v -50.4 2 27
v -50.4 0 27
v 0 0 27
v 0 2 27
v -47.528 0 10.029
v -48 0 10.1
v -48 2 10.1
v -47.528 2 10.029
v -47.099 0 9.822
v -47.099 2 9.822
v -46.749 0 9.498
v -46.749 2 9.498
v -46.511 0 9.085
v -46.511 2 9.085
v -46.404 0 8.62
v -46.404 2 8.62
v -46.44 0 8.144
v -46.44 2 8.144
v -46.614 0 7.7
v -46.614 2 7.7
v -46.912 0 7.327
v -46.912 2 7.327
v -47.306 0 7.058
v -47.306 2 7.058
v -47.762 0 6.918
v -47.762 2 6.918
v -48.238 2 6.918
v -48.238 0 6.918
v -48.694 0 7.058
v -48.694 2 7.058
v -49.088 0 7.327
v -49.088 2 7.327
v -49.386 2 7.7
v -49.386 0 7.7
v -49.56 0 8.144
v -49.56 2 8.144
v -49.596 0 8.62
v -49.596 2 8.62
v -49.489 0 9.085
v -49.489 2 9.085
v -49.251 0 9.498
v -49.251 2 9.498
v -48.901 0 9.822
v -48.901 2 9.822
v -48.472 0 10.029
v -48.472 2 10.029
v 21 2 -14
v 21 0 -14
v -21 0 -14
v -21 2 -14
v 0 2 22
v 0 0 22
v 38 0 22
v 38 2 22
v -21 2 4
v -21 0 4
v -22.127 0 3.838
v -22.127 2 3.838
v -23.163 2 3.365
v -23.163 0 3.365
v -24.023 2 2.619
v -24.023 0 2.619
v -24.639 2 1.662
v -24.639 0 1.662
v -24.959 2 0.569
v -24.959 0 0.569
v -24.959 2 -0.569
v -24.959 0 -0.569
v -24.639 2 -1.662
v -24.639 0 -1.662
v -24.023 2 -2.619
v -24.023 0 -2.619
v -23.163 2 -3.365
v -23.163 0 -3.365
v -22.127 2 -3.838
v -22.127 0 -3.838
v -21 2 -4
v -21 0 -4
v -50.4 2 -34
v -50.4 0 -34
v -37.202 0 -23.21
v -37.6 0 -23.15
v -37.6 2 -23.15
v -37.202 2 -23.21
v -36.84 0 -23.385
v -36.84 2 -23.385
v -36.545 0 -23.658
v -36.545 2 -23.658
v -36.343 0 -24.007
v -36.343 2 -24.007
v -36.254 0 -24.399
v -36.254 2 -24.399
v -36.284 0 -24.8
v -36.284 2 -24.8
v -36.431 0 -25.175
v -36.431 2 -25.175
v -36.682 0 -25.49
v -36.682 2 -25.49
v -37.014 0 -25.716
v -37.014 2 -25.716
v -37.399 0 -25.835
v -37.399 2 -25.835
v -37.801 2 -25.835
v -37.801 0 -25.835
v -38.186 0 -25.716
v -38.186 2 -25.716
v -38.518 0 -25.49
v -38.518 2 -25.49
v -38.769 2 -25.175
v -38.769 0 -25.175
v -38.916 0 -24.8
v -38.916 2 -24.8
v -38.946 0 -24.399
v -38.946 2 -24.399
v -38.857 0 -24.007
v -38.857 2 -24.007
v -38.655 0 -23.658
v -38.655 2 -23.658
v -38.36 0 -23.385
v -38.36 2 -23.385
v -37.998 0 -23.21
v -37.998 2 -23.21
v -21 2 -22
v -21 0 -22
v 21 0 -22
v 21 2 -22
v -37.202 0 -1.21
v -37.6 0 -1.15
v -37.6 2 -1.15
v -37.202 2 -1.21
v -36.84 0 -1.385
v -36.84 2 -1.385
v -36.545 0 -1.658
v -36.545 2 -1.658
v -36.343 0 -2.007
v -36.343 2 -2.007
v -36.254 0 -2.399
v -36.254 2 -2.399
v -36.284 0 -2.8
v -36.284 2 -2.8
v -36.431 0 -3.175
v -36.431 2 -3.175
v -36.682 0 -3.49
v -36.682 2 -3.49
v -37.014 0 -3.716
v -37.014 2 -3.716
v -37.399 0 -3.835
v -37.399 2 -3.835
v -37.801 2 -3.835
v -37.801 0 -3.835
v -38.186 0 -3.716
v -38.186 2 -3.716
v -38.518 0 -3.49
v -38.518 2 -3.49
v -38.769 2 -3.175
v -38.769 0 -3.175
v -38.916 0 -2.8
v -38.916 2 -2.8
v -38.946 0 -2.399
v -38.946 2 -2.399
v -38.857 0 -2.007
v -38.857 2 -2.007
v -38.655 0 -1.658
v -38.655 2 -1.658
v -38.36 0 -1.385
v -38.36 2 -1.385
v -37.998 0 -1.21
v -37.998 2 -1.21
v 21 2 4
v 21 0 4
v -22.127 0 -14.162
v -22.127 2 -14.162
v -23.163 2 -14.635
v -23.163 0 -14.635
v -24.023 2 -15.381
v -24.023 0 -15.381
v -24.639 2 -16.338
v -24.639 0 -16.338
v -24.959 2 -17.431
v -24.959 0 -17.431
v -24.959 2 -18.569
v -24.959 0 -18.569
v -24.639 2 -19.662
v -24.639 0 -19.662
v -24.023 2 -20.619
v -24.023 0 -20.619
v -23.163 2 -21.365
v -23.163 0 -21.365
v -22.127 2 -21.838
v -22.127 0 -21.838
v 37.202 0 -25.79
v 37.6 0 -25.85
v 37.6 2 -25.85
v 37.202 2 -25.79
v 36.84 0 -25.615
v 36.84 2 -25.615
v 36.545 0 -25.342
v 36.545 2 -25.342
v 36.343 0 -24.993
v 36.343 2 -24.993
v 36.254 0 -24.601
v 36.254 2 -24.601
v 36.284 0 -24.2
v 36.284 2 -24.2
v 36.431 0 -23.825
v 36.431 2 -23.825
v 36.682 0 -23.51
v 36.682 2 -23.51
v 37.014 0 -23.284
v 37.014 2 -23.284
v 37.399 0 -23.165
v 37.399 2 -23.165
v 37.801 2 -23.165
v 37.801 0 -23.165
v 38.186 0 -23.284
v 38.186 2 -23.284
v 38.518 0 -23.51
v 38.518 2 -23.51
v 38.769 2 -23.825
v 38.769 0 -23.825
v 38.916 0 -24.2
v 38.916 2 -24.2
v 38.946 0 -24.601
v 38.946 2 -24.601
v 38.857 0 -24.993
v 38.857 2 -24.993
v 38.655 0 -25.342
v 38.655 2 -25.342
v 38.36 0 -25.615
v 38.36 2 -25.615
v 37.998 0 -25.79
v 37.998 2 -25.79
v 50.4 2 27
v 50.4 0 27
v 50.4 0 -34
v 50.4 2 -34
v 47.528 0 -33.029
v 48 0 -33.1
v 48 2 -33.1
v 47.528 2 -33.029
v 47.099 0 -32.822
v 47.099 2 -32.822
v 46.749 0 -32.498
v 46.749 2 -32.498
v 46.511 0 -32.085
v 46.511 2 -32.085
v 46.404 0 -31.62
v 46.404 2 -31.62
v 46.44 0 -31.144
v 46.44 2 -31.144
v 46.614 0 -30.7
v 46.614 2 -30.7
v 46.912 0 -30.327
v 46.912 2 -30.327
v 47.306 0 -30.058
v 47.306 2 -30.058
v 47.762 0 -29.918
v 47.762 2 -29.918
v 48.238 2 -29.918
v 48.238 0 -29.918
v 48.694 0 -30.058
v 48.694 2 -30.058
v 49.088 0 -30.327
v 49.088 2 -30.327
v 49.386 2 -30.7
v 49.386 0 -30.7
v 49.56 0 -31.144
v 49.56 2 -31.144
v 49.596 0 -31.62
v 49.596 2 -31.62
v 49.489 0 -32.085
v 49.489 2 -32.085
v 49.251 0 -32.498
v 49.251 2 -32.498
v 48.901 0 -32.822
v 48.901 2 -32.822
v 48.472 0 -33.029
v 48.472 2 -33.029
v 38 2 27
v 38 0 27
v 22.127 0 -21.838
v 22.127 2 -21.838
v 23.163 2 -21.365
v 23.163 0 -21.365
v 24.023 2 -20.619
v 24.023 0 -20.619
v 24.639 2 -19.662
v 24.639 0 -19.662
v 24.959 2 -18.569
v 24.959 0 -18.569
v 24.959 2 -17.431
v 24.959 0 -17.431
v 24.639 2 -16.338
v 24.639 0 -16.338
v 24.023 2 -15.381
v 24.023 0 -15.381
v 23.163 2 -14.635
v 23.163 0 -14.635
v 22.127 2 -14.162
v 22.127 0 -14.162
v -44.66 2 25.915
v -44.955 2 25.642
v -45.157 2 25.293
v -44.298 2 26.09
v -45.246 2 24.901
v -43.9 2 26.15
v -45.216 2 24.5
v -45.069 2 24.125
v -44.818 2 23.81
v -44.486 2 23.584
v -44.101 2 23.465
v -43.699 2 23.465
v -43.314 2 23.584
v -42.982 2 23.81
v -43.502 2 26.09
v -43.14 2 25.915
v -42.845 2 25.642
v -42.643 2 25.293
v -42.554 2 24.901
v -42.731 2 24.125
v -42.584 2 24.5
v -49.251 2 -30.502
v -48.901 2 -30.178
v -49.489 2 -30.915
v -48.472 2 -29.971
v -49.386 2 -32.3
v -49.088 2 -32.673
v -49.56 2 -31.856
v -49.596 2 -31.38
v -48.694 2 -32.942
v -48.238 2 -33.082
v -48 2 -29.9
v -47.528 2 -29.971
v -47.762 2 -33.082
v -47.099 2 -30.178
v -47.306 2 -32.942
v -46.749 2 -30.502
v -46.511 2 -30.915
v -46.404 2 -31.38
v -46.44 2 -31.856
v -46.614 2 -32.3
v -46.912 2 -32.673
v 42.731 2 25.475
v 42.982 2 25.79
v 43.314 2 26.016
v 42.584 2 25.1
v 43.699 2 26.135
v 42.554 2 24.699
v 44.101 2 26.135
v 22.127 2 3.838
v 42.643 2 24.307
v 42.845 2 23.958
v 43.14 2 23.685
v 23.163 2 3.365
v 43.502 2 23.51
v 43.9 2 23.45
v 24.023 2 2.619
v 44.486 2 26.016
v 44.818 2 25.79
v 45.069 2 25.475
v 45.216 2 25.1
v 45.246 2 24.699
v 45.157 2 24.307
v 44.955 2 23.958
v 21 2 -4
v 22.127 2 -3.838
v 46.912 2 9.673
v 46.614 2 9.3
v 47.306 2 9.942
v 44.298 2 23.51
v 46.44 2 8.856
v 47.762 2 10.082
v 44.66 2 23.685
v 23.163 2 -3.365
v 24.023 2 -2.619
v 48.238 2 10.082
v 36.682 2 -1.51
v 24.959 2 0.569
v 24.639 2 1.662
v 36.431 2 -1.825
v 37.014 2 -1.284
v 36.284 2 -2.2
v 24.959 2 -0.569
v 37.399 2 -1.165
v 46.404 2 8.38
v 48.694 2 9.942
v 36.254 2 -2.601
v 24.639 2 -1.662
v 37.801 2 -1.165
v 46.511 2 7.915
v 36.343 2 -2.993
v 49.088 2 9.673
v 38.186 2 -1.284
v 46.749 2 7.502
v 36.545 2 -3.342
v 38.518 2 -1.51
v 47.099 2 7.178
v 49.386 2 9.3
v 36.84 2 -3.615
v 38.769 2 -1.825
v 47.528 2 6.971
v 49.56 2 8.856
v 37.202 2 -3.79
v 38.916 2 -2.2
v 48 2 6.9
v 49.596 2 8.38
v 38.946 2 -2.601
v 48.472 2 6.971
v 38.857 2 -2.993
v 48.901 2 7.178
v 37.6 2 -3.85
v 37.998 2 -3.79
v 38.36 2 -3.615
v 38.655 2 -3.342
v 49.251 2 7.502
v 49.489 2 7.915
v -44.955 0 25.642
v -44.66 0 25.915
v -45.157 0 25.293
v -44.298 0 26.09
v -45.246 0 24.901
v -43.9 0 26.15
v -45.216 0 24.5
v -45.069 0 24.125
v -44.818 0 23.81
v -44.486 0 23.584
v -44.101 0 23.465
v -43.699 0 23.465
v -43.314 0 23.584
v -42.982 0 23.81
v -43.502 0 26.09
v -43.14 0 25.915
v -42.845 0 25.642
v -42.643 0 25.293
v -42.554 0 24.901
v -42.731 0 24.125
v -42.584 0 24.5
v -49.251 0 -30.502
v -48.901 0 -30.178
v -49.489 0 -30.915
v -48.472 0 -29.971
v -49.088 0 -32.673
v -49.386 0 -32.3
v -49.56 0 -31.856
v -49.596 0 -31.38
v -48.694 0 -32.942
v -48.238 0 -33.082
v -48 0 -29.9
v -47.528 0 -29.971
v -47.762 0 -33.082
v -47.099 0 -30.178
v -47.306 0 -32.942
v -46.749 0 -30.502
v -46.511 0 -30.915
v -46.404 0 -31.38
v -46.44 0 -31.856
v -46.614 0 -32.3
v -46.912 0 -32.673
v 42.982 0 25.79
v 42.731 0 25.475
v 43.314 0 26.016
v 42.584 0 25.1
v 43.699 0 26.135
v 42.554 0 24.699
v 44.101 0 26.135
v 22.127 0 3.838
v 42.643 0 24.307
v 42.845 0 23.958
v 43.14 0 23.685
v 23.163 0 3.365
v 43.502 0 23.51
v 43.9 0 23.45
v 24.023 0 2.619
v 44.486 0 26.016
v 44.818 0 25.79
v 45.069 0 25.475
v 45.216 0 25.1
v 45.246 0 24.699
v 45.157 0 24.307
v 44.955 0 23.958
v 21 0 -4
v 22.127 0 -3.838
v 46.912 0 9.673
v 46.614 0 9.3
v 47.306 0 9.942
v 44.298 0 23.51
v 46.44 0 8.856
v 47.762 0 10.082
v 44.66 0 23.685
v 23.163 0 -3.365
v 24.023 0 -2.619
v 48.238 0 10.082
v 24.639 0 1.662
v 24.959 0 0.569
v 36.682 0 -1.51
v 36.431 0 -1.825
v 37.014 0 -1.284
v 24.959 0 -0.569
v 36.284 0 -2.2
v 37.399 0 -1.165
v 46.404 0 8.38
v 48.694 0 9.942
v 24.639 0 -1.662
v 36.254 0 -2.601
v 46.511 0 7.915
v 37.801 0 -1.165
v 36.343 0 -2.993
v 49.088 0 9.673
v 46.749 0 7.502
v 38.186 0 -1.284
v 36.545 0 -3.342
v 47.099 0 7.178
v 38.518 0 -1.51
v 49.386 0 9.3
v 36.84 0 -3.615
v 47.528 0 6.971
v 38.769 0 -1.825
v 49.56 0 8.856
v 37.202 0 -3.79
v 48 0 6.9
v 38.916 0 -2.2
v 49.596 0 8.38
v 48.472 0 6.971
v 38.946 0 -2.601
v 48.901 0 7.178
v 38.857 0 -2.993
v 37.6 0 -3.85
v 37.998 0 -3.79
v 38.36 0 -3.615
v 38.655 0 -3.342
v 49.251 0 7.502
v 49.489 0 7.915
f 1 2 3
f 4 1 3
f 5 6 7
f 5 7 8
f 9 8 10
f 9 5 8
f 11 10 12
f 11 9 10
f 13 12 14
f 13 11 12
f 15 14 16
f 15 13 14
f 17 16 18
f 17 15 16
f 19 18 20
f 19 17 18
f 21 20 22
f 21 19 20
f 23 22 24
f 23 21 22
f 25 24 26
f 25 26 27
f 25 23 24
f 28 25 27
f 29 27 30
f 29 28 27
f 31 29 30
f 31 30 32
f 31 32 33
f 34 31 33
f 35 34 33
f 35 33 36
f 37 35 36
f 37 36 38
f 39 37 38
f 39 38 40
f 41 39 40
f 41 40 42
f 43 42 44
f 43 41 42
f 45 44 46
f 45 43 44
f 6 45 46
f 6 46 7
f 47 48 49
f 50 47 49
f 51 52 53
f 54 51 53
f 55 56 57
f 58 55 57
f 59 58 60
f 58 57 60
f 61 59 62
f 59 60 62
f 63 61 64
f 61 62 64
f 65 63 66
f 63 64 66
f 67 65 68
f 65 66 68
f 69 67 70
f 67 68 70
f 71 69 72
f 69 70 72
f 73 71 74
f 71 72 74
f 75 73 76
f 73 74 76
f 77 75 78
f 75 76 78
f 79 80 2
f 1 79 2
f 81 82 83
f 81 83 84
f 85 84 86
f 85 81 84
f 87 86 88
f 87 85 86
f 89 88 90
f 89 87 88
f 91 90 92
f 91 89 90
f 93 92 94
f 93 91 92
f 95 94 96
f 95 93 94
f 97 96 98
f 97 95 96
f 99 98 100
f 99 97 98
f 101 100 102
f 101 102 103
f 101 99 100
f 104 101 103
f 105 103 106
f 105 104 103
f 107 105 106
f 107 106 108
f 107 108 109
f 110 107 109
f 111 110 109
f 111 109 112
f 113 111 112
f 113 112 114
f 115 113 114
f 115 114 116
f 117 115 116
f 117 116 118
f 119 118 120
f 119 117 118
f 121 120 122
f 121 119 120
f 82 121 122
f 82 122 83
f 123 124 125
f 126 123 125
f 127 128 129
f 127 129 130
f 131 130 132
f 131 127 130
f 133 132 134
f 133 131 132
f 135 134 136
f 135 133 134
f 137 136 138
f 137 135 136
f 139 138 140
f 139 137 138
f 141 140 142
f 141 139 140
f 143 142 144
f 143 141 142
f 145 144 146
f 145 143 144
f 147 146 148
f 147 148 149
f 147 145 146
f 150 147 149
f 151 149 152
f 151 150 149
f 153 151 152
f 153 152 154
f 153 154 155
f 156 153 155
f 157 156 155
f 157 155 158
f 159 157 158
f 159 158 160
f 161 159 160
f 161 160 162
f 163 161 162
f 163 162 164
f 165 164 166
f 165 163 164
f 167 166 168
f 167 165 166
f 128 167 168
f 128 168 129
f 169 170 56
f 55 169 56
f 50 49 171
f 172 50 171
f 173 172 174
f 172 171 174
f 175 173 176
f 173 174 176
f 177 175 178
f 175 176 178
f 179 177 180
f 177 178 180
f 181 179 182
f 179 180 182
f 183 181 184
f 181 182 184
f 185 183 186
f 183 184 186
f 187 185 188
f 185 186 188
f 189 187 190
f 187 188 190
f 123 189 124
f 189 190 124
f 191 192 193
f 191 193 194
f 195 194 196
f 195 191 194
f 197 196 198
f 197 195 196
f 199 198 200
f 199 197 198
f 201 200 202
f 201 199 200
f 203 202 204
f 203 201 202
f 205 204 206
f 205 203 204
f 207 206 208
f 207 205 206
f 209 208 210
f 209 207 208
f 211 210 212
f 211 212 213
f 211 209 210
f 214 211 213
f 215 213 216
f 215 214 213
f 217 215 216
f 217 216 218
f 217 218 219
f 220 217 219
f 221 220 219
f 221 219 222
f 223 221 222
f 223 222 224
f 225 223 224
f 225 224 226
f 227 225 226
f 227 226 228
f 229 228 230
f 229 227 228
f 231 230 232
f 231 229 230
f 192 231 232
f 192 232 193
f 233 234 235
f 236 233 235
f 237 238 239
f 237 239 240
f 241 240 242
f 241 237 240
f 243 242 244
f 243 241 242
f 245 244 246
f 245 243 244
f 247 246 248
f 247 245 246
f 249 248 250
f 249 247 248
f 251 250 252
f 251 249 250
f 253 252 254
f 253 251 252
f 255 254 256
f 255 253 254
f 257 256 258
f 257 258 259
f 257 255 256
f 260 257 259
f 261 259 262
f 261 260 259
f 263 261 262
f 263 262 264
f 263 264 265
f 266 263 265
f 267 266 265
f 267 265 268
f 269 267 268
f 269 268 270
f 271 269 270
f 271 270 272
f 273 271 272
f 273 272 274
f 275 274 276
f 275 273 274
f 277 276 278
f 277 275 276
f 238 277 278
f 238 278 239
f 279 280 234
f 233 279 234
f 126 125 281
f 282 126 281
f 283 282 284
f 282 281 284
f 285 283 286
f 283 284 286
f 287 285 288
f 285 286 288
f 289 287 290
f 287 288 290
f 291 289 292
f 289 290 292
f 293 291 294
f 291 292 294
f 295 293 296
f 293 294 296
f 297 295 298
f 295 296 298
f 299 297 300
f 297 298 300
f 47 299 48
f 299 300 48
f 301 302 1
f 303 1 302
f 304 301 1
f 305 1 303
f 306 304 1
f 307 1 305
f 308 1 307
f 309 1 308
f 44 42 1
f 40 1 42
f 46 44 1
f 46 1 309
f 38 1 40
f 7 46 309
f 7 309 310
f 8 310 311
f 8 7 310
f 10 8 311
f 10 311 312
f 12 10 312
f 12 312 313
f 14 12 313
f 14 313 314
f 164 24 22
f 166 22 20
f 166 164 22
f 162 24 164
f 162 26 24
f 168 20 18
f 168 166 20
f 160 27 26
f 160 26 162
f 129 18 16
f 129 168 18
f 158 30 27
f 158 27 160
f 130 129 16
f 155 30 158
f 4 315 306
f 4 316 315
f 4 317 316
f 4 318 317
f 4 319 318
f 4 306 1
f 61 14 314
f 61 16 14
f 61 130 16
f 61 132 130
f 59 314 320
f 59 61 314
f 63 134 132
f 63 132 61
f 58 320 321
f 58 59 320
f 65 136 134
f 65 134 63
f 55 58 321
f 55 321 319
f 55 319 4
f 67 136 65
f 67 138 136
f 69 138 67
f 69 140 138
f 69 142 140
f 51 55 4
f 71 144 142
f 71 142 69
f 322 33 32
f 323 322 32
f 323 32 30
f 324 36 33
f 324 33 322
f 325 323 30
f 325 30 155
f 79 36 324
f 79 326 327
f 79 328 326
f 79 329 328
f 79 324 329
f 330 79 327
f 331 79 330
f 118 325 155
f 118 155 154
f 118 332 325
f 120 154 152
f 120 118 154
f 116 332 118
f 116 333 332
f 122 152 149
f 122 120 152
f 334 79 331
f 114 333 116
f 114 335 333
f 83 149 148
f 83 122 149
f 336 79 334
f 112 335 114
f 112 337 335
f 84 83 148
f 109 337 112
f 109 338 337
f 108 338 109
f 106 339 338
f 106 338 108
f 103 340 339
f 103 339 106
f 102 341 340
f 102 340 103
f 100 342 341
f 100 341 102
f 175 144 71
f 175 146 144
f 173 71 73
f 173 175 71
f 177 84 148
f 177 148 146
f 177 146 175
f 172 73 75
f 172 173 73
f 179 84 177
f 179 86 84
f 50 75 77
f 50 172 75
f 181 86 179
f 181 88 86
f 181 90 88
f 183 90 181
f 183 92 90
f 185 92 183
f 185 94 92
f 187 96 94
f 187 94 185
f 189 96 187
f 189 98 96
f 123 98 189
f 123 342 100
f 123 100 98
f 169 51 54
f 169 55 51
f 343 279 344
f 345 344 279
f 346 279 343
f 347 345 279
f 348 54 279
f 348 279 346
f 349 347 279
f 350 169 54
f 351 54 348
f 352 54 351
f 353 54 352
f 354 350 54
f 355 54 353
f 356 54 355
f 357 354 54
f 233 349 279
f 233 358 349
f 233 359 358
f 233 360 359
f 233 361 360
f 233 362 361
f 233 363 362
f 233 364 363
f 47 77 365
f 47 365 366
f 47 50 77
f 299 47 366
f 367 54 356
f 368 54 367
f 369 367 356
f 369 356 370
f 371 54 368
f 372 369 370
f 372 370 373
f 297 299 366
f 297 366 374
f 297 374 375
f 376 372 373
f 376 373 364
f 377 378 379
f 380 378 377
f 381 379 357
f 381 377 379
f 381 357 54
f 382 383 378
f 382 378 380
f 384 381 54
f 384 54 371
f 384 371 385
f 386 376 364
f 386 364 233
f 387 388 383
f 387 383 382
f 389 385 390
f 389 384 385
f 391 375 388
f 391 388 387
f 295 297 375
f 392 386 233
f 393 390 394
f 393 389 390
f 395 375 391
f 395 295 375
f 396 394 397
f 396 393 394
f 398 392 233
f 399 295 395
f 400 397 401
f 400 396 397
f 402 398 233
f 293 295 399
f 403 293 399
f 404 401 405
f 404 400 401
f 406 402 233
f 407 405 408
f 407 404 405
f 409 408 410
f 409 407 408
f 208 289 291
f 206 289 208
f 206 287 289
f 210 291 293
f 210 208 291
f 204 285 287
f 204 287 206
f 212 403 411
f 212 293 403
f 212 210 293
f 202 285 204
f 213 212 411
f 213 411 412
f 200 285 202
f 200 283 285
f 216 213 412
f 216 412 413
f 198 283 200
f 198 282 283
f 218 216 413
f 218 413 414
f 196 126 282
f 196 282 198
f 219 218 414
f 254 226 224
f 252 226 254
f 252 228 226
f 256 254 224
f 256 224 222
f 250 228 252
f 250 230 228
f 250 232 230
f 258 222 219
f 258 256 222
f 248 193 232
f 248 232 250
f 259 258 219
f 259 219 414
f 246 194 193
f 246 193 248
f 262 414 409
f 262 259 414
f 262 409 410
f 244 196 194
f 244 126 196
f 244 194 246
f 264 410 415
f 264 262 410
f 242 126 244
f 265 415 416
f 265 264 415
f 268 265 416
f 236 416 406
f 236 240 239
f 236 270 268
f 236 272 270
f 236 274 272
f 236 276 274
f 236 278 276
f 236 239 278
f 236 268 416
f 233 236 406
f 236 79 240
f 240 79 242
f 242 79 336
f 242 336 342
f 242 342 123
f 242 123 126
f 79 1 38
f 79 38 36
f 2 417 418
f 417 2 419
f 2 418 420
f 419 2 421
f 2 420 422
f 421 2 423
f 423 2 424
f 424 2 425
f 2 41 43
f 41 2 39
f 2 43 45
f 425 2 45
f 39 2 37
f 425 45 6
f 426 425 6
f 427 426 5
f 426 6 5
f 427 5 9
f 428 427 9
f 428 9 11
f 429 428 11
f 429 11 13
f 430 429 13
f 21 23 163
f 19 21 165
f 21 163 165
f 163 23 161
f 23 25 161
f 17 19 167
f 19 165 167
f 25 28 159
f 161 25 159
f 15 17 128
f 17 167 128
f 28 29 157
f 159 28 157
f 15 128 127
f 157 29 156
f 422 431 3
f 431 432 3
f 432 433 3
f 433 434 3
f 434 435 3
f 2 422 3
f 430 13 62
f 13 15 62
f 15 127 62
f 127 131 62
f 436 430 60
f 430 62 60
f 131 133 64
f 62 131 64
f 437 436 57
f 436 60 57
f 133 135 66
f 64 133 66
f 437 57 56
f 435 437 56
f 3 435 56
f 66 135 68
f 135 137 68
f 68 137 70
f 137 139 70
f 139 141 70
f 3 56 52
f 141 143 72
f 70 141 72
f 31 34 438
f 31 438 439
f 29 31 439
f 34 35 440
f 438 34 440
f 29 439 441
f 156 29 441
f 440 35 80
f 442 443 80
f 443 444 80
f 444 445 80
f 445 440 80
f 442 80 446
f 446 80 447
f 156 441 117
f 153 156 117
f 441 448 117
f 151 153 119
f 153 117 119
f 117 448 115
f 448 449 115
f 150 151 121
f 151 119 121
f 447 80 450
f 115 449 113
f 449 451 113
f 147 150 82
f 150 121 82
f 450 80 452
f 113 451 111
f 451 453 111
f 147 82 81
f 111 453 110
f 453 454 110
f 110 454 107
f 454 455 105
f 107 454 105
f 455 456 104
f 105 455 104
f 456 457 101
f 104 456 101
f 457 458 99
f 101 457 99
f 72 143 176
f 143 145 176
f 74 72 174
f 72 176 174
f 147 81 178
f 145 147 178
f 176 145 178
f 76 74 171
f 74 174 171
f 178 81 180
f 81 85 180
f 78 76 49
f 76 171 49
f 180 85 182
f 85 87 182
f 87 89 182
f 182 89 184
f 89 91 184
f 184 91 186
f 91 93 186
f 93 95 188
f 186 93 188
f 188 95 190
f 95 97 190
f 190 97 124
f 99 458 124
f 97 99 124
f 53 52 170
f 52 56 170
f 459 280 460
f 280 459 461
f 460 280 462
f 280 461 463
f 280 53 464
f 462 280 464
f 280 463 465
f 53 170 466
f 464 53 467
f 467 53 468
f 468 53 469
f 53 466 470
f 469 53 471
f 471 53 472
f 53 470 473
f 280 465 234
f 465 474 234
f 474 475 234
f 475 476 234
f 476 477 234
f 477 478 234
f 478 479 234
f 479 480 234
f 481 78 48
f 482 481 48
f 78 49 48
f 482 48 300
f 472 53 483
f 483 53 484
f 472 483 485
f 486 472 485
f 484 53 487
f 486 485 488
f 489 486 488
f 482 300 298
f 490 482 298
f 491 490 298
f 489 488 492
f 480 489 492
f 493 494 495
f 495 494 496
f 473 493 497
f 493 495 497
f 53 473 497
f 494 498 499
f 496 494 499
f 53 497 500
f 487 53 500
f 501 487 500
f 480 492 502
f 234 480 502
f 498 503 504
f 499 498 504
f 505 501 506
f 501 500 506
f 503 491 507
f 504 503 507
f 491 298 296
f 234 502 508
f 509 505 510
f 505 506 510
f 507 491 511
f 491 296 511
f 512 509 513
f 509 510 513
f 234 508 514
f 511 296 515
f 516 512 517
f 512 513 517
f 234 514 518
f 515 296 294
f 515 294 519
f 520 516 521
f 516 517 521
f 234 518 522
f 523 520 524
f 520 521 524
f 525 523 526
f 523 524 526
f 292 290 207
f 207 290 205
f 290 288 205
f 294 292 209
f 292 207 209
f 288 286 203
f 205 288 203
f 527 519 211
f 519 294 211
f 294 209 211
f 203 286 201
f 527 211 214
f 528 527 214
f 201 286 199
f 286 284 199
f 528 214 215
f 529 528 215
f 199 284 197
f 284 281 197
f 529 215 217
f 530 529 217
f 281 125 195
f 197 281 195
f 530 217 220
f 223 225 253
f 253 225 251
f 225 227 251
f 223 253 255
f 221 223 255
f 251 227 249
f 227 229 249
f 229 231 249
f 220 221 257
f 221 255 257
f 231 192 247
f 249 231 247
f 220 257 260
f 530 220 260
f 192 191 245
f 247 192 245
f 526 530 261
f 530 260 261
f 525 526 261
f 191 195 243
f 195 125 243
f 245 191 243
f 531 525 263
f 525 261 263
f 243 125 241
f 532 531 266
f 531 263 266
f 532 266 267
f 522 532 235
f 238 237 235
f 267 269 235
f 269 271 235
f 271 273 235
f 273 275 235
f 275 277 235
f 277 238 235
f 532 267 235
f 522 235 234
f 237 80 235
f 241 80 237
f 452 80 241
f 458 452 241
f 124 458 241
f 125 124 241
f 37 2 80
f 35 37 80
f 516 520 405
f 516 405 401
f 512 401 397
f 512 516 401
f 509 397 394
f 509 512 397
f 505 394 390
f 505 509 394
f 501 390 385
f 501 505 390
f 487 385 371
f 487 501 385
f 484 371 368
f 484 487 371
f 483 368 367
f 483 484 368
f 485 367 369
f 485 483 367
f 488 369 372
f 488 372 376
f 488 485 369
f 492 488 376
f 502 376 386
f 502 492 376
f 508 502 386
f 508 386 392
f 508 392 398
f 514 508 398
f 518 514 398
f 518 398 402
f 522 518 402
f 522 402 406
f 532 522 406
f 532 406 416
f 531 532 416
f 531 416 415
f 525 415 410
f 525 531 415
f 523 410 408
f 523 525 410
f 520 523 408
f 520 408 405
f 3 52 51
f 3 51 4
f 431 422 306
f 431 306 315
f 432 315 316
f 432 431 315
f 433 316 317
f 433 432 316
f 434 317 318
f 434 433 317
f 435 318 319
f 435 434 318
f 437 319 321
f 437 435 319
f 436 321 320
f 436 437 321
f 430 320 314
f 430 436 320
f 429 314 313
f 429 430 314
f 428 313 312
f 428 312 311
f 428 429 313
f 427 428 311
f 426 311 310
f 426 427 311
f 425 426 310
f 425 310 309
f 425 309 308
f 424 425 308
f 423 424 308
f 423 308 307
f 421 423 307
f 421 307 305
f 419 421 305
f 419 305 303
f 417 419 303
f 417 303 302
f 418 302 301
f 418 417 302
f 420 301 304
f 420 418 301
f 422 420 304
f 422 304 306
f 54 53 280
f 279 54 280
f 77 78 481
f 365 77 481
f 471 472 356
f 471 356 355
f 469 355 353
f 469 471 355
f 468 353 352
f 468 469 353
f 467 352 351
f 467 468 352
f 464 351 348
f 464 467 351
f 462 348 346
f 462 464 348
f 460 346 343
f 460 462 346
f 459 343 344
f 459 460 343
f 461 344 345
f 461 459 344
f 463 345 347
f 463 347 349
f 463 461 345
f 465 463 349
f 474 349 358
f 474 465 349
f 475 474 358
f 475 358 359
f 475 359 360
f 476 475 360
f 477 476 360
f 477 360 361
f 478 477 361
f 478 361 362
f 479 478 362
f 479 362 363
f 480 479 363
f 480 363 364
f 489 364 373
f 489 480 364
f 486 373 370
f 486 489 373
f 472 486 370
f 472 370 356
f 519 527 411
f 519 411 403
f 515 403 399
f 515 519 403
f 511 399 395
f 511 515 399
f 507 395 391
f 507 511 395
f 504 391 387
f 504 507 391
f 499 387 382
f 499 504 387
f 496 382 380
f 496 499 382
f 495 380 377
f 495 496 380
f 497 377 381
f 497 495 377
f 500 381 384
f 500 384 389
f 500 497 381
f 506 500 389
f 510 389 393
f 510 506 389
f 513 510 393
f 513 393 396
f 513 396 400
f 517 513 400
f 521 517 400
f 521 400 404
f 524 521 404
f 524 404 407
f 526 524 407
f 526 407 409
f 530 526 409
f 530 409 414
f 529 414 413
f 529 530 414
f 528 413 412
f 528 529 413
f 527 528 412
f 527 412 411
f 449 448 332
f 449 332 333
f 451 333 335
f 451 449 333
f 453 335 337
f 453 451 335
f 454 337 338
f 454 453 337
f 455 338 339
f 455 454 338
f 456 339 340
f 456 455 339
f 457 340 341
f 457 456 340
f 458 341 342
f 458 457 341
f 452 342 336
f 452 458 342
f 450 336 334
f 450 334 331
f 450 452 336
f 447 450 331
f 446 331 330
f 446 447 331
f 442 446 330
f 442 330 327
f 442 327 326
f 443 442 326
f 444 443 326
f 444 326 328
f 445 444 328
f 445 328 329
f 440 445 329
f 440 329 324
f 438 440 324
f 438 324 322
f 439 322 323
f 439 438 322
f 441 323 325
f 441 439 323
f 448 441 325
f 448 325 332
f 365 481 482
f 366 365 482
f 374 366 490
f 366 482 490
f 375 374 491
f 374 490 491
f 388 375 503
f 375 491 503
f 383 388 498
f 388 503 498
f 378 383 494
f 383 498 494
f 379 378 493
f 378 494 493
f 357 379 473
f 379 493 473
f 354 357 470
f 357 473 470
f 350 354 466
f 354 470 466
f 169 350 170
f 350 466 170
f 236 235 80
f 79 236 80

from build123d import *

# Parameters (mm, degrees)
SKETCH_1_R          = 1.6
SKETCH_1_R_2        = 1.35
EXTRUDE_1_DEPTH     = 2
CUT_EXTRUDE_1_REACH = 62.829
SKETCH_2_W          = 38
SKETCH_2_H          = 12.009324428


with BuildPart() as part:
    # 草图1 → 凸台-拉伸1 (new body)
    with BuildSketch(Plane(origin=(0, 0, 0), x_dir=(1, 0, 0), z_dir=(0, 1, 0))):
        Polygon((-40.4, -27), (40.4, -27), (50.4, -27), (50.4, 27), (50.4, 34), (-50.4, 34), (-50.4, 27), (-50.4, -27), align=None)
        with Locations(Location((-48, 31.5, 0), (0, 0, 270))):
            Circle(SKETCH_1_R, mode=Mode.SUBTRACT)
        with Locations(Location((-37.6, 24.5, 0), (0, 0, 270))):
            Circle(SKETCH_1_R_2, mode=Mode.SUBTRACT)
        with Locations(Location((-43.9, -24.8, 0), (0, 0, 270))):
            Circle(SKETCH_1_R_2, mode=Mode.SUBTRACT)
        with Locations(Location((37.6, 24.5, 0), (0, 0, 90))):
            Circle(SKETCH_1_R_2, mode=Mode.SUBTRACT)
        with Locations(Location((43.9, -24.8, 0), (0, 0, 90))):
            Circle(SKETCH_1_R_2, mode=Mode.SUBTRACT)
        with Locations(Location((-48, -8.5, 0), (0, 0, 270))):
            Circle(SKETCH_1_R, mode=Mode.SUBTRACT)
        with Locations(Location((48, -8.5, 0), (0, 0, 90))):
            Circle(SKETCH_1_R, mode=Mode.SUBTRACT)
        with Locations(Location((48, 31.5, 0), (0, 0, 90))):
            Circle(SKETCH_1_R, mode=Mode.SUBTRACT)
        with Locations(Location((-37.6, 2.5, 0), (0, 0, 270))):
            Circle(SKETCH_1_R_2, mode=Mode.SUBTRACT)
        with Locations(Location((37.6, 2.5, 0), (0, 0, 90))):
            Circle(SKETCH_1_R_2, mode=Mode.SUBTRACT)
        with BuildLine():
            Line((-21, 22), (21, 22))
            ThreePointArc((21, 22), (25, 18), (21, 14))
            Line((21, 14), (-21, 14))
            ThreePointArc((-21, 14), (-25, 18), (-21, 22))
        make_face(mode=Mode.SUBTRACT)
        with BuildLine():
            Line((-21, 4), (21, 4))
            ThreePointArc((21, 4), (25, 0), (21, -4))
            Line((21, -4), (-21, -4))
            ThreePointArc((-21, -4), (-25, 0), (-21, 4))
        make_face(mode=Mode.SUBTRACT)
    extrude(amount=EXTRUDE_1_DEPTH)

    # 草图2 → 切除-拉伸1 (cut, up to next)
    with BuildSketch(Plane.XZ, mode=Mode.PRIVATE) as cut_extrude_1_sk1:
        with Locations((19, 28.004662214)):
            Rectangle(SKETCH_2_W, SKETCH_2_H)
    cut_extrude_1_tool1 = extrude(cut_extrude_1_sk1.sketch, amount=-CUT_EXTRUDE_1_REACH, mode=Mode.PRIVATE) & part.part
    add(cut_extrude_1_tool1.solids().sort_by_distance((19, 0, 28.004662))[0], mode=Mode.SUBTRACT)


solid = part.part
